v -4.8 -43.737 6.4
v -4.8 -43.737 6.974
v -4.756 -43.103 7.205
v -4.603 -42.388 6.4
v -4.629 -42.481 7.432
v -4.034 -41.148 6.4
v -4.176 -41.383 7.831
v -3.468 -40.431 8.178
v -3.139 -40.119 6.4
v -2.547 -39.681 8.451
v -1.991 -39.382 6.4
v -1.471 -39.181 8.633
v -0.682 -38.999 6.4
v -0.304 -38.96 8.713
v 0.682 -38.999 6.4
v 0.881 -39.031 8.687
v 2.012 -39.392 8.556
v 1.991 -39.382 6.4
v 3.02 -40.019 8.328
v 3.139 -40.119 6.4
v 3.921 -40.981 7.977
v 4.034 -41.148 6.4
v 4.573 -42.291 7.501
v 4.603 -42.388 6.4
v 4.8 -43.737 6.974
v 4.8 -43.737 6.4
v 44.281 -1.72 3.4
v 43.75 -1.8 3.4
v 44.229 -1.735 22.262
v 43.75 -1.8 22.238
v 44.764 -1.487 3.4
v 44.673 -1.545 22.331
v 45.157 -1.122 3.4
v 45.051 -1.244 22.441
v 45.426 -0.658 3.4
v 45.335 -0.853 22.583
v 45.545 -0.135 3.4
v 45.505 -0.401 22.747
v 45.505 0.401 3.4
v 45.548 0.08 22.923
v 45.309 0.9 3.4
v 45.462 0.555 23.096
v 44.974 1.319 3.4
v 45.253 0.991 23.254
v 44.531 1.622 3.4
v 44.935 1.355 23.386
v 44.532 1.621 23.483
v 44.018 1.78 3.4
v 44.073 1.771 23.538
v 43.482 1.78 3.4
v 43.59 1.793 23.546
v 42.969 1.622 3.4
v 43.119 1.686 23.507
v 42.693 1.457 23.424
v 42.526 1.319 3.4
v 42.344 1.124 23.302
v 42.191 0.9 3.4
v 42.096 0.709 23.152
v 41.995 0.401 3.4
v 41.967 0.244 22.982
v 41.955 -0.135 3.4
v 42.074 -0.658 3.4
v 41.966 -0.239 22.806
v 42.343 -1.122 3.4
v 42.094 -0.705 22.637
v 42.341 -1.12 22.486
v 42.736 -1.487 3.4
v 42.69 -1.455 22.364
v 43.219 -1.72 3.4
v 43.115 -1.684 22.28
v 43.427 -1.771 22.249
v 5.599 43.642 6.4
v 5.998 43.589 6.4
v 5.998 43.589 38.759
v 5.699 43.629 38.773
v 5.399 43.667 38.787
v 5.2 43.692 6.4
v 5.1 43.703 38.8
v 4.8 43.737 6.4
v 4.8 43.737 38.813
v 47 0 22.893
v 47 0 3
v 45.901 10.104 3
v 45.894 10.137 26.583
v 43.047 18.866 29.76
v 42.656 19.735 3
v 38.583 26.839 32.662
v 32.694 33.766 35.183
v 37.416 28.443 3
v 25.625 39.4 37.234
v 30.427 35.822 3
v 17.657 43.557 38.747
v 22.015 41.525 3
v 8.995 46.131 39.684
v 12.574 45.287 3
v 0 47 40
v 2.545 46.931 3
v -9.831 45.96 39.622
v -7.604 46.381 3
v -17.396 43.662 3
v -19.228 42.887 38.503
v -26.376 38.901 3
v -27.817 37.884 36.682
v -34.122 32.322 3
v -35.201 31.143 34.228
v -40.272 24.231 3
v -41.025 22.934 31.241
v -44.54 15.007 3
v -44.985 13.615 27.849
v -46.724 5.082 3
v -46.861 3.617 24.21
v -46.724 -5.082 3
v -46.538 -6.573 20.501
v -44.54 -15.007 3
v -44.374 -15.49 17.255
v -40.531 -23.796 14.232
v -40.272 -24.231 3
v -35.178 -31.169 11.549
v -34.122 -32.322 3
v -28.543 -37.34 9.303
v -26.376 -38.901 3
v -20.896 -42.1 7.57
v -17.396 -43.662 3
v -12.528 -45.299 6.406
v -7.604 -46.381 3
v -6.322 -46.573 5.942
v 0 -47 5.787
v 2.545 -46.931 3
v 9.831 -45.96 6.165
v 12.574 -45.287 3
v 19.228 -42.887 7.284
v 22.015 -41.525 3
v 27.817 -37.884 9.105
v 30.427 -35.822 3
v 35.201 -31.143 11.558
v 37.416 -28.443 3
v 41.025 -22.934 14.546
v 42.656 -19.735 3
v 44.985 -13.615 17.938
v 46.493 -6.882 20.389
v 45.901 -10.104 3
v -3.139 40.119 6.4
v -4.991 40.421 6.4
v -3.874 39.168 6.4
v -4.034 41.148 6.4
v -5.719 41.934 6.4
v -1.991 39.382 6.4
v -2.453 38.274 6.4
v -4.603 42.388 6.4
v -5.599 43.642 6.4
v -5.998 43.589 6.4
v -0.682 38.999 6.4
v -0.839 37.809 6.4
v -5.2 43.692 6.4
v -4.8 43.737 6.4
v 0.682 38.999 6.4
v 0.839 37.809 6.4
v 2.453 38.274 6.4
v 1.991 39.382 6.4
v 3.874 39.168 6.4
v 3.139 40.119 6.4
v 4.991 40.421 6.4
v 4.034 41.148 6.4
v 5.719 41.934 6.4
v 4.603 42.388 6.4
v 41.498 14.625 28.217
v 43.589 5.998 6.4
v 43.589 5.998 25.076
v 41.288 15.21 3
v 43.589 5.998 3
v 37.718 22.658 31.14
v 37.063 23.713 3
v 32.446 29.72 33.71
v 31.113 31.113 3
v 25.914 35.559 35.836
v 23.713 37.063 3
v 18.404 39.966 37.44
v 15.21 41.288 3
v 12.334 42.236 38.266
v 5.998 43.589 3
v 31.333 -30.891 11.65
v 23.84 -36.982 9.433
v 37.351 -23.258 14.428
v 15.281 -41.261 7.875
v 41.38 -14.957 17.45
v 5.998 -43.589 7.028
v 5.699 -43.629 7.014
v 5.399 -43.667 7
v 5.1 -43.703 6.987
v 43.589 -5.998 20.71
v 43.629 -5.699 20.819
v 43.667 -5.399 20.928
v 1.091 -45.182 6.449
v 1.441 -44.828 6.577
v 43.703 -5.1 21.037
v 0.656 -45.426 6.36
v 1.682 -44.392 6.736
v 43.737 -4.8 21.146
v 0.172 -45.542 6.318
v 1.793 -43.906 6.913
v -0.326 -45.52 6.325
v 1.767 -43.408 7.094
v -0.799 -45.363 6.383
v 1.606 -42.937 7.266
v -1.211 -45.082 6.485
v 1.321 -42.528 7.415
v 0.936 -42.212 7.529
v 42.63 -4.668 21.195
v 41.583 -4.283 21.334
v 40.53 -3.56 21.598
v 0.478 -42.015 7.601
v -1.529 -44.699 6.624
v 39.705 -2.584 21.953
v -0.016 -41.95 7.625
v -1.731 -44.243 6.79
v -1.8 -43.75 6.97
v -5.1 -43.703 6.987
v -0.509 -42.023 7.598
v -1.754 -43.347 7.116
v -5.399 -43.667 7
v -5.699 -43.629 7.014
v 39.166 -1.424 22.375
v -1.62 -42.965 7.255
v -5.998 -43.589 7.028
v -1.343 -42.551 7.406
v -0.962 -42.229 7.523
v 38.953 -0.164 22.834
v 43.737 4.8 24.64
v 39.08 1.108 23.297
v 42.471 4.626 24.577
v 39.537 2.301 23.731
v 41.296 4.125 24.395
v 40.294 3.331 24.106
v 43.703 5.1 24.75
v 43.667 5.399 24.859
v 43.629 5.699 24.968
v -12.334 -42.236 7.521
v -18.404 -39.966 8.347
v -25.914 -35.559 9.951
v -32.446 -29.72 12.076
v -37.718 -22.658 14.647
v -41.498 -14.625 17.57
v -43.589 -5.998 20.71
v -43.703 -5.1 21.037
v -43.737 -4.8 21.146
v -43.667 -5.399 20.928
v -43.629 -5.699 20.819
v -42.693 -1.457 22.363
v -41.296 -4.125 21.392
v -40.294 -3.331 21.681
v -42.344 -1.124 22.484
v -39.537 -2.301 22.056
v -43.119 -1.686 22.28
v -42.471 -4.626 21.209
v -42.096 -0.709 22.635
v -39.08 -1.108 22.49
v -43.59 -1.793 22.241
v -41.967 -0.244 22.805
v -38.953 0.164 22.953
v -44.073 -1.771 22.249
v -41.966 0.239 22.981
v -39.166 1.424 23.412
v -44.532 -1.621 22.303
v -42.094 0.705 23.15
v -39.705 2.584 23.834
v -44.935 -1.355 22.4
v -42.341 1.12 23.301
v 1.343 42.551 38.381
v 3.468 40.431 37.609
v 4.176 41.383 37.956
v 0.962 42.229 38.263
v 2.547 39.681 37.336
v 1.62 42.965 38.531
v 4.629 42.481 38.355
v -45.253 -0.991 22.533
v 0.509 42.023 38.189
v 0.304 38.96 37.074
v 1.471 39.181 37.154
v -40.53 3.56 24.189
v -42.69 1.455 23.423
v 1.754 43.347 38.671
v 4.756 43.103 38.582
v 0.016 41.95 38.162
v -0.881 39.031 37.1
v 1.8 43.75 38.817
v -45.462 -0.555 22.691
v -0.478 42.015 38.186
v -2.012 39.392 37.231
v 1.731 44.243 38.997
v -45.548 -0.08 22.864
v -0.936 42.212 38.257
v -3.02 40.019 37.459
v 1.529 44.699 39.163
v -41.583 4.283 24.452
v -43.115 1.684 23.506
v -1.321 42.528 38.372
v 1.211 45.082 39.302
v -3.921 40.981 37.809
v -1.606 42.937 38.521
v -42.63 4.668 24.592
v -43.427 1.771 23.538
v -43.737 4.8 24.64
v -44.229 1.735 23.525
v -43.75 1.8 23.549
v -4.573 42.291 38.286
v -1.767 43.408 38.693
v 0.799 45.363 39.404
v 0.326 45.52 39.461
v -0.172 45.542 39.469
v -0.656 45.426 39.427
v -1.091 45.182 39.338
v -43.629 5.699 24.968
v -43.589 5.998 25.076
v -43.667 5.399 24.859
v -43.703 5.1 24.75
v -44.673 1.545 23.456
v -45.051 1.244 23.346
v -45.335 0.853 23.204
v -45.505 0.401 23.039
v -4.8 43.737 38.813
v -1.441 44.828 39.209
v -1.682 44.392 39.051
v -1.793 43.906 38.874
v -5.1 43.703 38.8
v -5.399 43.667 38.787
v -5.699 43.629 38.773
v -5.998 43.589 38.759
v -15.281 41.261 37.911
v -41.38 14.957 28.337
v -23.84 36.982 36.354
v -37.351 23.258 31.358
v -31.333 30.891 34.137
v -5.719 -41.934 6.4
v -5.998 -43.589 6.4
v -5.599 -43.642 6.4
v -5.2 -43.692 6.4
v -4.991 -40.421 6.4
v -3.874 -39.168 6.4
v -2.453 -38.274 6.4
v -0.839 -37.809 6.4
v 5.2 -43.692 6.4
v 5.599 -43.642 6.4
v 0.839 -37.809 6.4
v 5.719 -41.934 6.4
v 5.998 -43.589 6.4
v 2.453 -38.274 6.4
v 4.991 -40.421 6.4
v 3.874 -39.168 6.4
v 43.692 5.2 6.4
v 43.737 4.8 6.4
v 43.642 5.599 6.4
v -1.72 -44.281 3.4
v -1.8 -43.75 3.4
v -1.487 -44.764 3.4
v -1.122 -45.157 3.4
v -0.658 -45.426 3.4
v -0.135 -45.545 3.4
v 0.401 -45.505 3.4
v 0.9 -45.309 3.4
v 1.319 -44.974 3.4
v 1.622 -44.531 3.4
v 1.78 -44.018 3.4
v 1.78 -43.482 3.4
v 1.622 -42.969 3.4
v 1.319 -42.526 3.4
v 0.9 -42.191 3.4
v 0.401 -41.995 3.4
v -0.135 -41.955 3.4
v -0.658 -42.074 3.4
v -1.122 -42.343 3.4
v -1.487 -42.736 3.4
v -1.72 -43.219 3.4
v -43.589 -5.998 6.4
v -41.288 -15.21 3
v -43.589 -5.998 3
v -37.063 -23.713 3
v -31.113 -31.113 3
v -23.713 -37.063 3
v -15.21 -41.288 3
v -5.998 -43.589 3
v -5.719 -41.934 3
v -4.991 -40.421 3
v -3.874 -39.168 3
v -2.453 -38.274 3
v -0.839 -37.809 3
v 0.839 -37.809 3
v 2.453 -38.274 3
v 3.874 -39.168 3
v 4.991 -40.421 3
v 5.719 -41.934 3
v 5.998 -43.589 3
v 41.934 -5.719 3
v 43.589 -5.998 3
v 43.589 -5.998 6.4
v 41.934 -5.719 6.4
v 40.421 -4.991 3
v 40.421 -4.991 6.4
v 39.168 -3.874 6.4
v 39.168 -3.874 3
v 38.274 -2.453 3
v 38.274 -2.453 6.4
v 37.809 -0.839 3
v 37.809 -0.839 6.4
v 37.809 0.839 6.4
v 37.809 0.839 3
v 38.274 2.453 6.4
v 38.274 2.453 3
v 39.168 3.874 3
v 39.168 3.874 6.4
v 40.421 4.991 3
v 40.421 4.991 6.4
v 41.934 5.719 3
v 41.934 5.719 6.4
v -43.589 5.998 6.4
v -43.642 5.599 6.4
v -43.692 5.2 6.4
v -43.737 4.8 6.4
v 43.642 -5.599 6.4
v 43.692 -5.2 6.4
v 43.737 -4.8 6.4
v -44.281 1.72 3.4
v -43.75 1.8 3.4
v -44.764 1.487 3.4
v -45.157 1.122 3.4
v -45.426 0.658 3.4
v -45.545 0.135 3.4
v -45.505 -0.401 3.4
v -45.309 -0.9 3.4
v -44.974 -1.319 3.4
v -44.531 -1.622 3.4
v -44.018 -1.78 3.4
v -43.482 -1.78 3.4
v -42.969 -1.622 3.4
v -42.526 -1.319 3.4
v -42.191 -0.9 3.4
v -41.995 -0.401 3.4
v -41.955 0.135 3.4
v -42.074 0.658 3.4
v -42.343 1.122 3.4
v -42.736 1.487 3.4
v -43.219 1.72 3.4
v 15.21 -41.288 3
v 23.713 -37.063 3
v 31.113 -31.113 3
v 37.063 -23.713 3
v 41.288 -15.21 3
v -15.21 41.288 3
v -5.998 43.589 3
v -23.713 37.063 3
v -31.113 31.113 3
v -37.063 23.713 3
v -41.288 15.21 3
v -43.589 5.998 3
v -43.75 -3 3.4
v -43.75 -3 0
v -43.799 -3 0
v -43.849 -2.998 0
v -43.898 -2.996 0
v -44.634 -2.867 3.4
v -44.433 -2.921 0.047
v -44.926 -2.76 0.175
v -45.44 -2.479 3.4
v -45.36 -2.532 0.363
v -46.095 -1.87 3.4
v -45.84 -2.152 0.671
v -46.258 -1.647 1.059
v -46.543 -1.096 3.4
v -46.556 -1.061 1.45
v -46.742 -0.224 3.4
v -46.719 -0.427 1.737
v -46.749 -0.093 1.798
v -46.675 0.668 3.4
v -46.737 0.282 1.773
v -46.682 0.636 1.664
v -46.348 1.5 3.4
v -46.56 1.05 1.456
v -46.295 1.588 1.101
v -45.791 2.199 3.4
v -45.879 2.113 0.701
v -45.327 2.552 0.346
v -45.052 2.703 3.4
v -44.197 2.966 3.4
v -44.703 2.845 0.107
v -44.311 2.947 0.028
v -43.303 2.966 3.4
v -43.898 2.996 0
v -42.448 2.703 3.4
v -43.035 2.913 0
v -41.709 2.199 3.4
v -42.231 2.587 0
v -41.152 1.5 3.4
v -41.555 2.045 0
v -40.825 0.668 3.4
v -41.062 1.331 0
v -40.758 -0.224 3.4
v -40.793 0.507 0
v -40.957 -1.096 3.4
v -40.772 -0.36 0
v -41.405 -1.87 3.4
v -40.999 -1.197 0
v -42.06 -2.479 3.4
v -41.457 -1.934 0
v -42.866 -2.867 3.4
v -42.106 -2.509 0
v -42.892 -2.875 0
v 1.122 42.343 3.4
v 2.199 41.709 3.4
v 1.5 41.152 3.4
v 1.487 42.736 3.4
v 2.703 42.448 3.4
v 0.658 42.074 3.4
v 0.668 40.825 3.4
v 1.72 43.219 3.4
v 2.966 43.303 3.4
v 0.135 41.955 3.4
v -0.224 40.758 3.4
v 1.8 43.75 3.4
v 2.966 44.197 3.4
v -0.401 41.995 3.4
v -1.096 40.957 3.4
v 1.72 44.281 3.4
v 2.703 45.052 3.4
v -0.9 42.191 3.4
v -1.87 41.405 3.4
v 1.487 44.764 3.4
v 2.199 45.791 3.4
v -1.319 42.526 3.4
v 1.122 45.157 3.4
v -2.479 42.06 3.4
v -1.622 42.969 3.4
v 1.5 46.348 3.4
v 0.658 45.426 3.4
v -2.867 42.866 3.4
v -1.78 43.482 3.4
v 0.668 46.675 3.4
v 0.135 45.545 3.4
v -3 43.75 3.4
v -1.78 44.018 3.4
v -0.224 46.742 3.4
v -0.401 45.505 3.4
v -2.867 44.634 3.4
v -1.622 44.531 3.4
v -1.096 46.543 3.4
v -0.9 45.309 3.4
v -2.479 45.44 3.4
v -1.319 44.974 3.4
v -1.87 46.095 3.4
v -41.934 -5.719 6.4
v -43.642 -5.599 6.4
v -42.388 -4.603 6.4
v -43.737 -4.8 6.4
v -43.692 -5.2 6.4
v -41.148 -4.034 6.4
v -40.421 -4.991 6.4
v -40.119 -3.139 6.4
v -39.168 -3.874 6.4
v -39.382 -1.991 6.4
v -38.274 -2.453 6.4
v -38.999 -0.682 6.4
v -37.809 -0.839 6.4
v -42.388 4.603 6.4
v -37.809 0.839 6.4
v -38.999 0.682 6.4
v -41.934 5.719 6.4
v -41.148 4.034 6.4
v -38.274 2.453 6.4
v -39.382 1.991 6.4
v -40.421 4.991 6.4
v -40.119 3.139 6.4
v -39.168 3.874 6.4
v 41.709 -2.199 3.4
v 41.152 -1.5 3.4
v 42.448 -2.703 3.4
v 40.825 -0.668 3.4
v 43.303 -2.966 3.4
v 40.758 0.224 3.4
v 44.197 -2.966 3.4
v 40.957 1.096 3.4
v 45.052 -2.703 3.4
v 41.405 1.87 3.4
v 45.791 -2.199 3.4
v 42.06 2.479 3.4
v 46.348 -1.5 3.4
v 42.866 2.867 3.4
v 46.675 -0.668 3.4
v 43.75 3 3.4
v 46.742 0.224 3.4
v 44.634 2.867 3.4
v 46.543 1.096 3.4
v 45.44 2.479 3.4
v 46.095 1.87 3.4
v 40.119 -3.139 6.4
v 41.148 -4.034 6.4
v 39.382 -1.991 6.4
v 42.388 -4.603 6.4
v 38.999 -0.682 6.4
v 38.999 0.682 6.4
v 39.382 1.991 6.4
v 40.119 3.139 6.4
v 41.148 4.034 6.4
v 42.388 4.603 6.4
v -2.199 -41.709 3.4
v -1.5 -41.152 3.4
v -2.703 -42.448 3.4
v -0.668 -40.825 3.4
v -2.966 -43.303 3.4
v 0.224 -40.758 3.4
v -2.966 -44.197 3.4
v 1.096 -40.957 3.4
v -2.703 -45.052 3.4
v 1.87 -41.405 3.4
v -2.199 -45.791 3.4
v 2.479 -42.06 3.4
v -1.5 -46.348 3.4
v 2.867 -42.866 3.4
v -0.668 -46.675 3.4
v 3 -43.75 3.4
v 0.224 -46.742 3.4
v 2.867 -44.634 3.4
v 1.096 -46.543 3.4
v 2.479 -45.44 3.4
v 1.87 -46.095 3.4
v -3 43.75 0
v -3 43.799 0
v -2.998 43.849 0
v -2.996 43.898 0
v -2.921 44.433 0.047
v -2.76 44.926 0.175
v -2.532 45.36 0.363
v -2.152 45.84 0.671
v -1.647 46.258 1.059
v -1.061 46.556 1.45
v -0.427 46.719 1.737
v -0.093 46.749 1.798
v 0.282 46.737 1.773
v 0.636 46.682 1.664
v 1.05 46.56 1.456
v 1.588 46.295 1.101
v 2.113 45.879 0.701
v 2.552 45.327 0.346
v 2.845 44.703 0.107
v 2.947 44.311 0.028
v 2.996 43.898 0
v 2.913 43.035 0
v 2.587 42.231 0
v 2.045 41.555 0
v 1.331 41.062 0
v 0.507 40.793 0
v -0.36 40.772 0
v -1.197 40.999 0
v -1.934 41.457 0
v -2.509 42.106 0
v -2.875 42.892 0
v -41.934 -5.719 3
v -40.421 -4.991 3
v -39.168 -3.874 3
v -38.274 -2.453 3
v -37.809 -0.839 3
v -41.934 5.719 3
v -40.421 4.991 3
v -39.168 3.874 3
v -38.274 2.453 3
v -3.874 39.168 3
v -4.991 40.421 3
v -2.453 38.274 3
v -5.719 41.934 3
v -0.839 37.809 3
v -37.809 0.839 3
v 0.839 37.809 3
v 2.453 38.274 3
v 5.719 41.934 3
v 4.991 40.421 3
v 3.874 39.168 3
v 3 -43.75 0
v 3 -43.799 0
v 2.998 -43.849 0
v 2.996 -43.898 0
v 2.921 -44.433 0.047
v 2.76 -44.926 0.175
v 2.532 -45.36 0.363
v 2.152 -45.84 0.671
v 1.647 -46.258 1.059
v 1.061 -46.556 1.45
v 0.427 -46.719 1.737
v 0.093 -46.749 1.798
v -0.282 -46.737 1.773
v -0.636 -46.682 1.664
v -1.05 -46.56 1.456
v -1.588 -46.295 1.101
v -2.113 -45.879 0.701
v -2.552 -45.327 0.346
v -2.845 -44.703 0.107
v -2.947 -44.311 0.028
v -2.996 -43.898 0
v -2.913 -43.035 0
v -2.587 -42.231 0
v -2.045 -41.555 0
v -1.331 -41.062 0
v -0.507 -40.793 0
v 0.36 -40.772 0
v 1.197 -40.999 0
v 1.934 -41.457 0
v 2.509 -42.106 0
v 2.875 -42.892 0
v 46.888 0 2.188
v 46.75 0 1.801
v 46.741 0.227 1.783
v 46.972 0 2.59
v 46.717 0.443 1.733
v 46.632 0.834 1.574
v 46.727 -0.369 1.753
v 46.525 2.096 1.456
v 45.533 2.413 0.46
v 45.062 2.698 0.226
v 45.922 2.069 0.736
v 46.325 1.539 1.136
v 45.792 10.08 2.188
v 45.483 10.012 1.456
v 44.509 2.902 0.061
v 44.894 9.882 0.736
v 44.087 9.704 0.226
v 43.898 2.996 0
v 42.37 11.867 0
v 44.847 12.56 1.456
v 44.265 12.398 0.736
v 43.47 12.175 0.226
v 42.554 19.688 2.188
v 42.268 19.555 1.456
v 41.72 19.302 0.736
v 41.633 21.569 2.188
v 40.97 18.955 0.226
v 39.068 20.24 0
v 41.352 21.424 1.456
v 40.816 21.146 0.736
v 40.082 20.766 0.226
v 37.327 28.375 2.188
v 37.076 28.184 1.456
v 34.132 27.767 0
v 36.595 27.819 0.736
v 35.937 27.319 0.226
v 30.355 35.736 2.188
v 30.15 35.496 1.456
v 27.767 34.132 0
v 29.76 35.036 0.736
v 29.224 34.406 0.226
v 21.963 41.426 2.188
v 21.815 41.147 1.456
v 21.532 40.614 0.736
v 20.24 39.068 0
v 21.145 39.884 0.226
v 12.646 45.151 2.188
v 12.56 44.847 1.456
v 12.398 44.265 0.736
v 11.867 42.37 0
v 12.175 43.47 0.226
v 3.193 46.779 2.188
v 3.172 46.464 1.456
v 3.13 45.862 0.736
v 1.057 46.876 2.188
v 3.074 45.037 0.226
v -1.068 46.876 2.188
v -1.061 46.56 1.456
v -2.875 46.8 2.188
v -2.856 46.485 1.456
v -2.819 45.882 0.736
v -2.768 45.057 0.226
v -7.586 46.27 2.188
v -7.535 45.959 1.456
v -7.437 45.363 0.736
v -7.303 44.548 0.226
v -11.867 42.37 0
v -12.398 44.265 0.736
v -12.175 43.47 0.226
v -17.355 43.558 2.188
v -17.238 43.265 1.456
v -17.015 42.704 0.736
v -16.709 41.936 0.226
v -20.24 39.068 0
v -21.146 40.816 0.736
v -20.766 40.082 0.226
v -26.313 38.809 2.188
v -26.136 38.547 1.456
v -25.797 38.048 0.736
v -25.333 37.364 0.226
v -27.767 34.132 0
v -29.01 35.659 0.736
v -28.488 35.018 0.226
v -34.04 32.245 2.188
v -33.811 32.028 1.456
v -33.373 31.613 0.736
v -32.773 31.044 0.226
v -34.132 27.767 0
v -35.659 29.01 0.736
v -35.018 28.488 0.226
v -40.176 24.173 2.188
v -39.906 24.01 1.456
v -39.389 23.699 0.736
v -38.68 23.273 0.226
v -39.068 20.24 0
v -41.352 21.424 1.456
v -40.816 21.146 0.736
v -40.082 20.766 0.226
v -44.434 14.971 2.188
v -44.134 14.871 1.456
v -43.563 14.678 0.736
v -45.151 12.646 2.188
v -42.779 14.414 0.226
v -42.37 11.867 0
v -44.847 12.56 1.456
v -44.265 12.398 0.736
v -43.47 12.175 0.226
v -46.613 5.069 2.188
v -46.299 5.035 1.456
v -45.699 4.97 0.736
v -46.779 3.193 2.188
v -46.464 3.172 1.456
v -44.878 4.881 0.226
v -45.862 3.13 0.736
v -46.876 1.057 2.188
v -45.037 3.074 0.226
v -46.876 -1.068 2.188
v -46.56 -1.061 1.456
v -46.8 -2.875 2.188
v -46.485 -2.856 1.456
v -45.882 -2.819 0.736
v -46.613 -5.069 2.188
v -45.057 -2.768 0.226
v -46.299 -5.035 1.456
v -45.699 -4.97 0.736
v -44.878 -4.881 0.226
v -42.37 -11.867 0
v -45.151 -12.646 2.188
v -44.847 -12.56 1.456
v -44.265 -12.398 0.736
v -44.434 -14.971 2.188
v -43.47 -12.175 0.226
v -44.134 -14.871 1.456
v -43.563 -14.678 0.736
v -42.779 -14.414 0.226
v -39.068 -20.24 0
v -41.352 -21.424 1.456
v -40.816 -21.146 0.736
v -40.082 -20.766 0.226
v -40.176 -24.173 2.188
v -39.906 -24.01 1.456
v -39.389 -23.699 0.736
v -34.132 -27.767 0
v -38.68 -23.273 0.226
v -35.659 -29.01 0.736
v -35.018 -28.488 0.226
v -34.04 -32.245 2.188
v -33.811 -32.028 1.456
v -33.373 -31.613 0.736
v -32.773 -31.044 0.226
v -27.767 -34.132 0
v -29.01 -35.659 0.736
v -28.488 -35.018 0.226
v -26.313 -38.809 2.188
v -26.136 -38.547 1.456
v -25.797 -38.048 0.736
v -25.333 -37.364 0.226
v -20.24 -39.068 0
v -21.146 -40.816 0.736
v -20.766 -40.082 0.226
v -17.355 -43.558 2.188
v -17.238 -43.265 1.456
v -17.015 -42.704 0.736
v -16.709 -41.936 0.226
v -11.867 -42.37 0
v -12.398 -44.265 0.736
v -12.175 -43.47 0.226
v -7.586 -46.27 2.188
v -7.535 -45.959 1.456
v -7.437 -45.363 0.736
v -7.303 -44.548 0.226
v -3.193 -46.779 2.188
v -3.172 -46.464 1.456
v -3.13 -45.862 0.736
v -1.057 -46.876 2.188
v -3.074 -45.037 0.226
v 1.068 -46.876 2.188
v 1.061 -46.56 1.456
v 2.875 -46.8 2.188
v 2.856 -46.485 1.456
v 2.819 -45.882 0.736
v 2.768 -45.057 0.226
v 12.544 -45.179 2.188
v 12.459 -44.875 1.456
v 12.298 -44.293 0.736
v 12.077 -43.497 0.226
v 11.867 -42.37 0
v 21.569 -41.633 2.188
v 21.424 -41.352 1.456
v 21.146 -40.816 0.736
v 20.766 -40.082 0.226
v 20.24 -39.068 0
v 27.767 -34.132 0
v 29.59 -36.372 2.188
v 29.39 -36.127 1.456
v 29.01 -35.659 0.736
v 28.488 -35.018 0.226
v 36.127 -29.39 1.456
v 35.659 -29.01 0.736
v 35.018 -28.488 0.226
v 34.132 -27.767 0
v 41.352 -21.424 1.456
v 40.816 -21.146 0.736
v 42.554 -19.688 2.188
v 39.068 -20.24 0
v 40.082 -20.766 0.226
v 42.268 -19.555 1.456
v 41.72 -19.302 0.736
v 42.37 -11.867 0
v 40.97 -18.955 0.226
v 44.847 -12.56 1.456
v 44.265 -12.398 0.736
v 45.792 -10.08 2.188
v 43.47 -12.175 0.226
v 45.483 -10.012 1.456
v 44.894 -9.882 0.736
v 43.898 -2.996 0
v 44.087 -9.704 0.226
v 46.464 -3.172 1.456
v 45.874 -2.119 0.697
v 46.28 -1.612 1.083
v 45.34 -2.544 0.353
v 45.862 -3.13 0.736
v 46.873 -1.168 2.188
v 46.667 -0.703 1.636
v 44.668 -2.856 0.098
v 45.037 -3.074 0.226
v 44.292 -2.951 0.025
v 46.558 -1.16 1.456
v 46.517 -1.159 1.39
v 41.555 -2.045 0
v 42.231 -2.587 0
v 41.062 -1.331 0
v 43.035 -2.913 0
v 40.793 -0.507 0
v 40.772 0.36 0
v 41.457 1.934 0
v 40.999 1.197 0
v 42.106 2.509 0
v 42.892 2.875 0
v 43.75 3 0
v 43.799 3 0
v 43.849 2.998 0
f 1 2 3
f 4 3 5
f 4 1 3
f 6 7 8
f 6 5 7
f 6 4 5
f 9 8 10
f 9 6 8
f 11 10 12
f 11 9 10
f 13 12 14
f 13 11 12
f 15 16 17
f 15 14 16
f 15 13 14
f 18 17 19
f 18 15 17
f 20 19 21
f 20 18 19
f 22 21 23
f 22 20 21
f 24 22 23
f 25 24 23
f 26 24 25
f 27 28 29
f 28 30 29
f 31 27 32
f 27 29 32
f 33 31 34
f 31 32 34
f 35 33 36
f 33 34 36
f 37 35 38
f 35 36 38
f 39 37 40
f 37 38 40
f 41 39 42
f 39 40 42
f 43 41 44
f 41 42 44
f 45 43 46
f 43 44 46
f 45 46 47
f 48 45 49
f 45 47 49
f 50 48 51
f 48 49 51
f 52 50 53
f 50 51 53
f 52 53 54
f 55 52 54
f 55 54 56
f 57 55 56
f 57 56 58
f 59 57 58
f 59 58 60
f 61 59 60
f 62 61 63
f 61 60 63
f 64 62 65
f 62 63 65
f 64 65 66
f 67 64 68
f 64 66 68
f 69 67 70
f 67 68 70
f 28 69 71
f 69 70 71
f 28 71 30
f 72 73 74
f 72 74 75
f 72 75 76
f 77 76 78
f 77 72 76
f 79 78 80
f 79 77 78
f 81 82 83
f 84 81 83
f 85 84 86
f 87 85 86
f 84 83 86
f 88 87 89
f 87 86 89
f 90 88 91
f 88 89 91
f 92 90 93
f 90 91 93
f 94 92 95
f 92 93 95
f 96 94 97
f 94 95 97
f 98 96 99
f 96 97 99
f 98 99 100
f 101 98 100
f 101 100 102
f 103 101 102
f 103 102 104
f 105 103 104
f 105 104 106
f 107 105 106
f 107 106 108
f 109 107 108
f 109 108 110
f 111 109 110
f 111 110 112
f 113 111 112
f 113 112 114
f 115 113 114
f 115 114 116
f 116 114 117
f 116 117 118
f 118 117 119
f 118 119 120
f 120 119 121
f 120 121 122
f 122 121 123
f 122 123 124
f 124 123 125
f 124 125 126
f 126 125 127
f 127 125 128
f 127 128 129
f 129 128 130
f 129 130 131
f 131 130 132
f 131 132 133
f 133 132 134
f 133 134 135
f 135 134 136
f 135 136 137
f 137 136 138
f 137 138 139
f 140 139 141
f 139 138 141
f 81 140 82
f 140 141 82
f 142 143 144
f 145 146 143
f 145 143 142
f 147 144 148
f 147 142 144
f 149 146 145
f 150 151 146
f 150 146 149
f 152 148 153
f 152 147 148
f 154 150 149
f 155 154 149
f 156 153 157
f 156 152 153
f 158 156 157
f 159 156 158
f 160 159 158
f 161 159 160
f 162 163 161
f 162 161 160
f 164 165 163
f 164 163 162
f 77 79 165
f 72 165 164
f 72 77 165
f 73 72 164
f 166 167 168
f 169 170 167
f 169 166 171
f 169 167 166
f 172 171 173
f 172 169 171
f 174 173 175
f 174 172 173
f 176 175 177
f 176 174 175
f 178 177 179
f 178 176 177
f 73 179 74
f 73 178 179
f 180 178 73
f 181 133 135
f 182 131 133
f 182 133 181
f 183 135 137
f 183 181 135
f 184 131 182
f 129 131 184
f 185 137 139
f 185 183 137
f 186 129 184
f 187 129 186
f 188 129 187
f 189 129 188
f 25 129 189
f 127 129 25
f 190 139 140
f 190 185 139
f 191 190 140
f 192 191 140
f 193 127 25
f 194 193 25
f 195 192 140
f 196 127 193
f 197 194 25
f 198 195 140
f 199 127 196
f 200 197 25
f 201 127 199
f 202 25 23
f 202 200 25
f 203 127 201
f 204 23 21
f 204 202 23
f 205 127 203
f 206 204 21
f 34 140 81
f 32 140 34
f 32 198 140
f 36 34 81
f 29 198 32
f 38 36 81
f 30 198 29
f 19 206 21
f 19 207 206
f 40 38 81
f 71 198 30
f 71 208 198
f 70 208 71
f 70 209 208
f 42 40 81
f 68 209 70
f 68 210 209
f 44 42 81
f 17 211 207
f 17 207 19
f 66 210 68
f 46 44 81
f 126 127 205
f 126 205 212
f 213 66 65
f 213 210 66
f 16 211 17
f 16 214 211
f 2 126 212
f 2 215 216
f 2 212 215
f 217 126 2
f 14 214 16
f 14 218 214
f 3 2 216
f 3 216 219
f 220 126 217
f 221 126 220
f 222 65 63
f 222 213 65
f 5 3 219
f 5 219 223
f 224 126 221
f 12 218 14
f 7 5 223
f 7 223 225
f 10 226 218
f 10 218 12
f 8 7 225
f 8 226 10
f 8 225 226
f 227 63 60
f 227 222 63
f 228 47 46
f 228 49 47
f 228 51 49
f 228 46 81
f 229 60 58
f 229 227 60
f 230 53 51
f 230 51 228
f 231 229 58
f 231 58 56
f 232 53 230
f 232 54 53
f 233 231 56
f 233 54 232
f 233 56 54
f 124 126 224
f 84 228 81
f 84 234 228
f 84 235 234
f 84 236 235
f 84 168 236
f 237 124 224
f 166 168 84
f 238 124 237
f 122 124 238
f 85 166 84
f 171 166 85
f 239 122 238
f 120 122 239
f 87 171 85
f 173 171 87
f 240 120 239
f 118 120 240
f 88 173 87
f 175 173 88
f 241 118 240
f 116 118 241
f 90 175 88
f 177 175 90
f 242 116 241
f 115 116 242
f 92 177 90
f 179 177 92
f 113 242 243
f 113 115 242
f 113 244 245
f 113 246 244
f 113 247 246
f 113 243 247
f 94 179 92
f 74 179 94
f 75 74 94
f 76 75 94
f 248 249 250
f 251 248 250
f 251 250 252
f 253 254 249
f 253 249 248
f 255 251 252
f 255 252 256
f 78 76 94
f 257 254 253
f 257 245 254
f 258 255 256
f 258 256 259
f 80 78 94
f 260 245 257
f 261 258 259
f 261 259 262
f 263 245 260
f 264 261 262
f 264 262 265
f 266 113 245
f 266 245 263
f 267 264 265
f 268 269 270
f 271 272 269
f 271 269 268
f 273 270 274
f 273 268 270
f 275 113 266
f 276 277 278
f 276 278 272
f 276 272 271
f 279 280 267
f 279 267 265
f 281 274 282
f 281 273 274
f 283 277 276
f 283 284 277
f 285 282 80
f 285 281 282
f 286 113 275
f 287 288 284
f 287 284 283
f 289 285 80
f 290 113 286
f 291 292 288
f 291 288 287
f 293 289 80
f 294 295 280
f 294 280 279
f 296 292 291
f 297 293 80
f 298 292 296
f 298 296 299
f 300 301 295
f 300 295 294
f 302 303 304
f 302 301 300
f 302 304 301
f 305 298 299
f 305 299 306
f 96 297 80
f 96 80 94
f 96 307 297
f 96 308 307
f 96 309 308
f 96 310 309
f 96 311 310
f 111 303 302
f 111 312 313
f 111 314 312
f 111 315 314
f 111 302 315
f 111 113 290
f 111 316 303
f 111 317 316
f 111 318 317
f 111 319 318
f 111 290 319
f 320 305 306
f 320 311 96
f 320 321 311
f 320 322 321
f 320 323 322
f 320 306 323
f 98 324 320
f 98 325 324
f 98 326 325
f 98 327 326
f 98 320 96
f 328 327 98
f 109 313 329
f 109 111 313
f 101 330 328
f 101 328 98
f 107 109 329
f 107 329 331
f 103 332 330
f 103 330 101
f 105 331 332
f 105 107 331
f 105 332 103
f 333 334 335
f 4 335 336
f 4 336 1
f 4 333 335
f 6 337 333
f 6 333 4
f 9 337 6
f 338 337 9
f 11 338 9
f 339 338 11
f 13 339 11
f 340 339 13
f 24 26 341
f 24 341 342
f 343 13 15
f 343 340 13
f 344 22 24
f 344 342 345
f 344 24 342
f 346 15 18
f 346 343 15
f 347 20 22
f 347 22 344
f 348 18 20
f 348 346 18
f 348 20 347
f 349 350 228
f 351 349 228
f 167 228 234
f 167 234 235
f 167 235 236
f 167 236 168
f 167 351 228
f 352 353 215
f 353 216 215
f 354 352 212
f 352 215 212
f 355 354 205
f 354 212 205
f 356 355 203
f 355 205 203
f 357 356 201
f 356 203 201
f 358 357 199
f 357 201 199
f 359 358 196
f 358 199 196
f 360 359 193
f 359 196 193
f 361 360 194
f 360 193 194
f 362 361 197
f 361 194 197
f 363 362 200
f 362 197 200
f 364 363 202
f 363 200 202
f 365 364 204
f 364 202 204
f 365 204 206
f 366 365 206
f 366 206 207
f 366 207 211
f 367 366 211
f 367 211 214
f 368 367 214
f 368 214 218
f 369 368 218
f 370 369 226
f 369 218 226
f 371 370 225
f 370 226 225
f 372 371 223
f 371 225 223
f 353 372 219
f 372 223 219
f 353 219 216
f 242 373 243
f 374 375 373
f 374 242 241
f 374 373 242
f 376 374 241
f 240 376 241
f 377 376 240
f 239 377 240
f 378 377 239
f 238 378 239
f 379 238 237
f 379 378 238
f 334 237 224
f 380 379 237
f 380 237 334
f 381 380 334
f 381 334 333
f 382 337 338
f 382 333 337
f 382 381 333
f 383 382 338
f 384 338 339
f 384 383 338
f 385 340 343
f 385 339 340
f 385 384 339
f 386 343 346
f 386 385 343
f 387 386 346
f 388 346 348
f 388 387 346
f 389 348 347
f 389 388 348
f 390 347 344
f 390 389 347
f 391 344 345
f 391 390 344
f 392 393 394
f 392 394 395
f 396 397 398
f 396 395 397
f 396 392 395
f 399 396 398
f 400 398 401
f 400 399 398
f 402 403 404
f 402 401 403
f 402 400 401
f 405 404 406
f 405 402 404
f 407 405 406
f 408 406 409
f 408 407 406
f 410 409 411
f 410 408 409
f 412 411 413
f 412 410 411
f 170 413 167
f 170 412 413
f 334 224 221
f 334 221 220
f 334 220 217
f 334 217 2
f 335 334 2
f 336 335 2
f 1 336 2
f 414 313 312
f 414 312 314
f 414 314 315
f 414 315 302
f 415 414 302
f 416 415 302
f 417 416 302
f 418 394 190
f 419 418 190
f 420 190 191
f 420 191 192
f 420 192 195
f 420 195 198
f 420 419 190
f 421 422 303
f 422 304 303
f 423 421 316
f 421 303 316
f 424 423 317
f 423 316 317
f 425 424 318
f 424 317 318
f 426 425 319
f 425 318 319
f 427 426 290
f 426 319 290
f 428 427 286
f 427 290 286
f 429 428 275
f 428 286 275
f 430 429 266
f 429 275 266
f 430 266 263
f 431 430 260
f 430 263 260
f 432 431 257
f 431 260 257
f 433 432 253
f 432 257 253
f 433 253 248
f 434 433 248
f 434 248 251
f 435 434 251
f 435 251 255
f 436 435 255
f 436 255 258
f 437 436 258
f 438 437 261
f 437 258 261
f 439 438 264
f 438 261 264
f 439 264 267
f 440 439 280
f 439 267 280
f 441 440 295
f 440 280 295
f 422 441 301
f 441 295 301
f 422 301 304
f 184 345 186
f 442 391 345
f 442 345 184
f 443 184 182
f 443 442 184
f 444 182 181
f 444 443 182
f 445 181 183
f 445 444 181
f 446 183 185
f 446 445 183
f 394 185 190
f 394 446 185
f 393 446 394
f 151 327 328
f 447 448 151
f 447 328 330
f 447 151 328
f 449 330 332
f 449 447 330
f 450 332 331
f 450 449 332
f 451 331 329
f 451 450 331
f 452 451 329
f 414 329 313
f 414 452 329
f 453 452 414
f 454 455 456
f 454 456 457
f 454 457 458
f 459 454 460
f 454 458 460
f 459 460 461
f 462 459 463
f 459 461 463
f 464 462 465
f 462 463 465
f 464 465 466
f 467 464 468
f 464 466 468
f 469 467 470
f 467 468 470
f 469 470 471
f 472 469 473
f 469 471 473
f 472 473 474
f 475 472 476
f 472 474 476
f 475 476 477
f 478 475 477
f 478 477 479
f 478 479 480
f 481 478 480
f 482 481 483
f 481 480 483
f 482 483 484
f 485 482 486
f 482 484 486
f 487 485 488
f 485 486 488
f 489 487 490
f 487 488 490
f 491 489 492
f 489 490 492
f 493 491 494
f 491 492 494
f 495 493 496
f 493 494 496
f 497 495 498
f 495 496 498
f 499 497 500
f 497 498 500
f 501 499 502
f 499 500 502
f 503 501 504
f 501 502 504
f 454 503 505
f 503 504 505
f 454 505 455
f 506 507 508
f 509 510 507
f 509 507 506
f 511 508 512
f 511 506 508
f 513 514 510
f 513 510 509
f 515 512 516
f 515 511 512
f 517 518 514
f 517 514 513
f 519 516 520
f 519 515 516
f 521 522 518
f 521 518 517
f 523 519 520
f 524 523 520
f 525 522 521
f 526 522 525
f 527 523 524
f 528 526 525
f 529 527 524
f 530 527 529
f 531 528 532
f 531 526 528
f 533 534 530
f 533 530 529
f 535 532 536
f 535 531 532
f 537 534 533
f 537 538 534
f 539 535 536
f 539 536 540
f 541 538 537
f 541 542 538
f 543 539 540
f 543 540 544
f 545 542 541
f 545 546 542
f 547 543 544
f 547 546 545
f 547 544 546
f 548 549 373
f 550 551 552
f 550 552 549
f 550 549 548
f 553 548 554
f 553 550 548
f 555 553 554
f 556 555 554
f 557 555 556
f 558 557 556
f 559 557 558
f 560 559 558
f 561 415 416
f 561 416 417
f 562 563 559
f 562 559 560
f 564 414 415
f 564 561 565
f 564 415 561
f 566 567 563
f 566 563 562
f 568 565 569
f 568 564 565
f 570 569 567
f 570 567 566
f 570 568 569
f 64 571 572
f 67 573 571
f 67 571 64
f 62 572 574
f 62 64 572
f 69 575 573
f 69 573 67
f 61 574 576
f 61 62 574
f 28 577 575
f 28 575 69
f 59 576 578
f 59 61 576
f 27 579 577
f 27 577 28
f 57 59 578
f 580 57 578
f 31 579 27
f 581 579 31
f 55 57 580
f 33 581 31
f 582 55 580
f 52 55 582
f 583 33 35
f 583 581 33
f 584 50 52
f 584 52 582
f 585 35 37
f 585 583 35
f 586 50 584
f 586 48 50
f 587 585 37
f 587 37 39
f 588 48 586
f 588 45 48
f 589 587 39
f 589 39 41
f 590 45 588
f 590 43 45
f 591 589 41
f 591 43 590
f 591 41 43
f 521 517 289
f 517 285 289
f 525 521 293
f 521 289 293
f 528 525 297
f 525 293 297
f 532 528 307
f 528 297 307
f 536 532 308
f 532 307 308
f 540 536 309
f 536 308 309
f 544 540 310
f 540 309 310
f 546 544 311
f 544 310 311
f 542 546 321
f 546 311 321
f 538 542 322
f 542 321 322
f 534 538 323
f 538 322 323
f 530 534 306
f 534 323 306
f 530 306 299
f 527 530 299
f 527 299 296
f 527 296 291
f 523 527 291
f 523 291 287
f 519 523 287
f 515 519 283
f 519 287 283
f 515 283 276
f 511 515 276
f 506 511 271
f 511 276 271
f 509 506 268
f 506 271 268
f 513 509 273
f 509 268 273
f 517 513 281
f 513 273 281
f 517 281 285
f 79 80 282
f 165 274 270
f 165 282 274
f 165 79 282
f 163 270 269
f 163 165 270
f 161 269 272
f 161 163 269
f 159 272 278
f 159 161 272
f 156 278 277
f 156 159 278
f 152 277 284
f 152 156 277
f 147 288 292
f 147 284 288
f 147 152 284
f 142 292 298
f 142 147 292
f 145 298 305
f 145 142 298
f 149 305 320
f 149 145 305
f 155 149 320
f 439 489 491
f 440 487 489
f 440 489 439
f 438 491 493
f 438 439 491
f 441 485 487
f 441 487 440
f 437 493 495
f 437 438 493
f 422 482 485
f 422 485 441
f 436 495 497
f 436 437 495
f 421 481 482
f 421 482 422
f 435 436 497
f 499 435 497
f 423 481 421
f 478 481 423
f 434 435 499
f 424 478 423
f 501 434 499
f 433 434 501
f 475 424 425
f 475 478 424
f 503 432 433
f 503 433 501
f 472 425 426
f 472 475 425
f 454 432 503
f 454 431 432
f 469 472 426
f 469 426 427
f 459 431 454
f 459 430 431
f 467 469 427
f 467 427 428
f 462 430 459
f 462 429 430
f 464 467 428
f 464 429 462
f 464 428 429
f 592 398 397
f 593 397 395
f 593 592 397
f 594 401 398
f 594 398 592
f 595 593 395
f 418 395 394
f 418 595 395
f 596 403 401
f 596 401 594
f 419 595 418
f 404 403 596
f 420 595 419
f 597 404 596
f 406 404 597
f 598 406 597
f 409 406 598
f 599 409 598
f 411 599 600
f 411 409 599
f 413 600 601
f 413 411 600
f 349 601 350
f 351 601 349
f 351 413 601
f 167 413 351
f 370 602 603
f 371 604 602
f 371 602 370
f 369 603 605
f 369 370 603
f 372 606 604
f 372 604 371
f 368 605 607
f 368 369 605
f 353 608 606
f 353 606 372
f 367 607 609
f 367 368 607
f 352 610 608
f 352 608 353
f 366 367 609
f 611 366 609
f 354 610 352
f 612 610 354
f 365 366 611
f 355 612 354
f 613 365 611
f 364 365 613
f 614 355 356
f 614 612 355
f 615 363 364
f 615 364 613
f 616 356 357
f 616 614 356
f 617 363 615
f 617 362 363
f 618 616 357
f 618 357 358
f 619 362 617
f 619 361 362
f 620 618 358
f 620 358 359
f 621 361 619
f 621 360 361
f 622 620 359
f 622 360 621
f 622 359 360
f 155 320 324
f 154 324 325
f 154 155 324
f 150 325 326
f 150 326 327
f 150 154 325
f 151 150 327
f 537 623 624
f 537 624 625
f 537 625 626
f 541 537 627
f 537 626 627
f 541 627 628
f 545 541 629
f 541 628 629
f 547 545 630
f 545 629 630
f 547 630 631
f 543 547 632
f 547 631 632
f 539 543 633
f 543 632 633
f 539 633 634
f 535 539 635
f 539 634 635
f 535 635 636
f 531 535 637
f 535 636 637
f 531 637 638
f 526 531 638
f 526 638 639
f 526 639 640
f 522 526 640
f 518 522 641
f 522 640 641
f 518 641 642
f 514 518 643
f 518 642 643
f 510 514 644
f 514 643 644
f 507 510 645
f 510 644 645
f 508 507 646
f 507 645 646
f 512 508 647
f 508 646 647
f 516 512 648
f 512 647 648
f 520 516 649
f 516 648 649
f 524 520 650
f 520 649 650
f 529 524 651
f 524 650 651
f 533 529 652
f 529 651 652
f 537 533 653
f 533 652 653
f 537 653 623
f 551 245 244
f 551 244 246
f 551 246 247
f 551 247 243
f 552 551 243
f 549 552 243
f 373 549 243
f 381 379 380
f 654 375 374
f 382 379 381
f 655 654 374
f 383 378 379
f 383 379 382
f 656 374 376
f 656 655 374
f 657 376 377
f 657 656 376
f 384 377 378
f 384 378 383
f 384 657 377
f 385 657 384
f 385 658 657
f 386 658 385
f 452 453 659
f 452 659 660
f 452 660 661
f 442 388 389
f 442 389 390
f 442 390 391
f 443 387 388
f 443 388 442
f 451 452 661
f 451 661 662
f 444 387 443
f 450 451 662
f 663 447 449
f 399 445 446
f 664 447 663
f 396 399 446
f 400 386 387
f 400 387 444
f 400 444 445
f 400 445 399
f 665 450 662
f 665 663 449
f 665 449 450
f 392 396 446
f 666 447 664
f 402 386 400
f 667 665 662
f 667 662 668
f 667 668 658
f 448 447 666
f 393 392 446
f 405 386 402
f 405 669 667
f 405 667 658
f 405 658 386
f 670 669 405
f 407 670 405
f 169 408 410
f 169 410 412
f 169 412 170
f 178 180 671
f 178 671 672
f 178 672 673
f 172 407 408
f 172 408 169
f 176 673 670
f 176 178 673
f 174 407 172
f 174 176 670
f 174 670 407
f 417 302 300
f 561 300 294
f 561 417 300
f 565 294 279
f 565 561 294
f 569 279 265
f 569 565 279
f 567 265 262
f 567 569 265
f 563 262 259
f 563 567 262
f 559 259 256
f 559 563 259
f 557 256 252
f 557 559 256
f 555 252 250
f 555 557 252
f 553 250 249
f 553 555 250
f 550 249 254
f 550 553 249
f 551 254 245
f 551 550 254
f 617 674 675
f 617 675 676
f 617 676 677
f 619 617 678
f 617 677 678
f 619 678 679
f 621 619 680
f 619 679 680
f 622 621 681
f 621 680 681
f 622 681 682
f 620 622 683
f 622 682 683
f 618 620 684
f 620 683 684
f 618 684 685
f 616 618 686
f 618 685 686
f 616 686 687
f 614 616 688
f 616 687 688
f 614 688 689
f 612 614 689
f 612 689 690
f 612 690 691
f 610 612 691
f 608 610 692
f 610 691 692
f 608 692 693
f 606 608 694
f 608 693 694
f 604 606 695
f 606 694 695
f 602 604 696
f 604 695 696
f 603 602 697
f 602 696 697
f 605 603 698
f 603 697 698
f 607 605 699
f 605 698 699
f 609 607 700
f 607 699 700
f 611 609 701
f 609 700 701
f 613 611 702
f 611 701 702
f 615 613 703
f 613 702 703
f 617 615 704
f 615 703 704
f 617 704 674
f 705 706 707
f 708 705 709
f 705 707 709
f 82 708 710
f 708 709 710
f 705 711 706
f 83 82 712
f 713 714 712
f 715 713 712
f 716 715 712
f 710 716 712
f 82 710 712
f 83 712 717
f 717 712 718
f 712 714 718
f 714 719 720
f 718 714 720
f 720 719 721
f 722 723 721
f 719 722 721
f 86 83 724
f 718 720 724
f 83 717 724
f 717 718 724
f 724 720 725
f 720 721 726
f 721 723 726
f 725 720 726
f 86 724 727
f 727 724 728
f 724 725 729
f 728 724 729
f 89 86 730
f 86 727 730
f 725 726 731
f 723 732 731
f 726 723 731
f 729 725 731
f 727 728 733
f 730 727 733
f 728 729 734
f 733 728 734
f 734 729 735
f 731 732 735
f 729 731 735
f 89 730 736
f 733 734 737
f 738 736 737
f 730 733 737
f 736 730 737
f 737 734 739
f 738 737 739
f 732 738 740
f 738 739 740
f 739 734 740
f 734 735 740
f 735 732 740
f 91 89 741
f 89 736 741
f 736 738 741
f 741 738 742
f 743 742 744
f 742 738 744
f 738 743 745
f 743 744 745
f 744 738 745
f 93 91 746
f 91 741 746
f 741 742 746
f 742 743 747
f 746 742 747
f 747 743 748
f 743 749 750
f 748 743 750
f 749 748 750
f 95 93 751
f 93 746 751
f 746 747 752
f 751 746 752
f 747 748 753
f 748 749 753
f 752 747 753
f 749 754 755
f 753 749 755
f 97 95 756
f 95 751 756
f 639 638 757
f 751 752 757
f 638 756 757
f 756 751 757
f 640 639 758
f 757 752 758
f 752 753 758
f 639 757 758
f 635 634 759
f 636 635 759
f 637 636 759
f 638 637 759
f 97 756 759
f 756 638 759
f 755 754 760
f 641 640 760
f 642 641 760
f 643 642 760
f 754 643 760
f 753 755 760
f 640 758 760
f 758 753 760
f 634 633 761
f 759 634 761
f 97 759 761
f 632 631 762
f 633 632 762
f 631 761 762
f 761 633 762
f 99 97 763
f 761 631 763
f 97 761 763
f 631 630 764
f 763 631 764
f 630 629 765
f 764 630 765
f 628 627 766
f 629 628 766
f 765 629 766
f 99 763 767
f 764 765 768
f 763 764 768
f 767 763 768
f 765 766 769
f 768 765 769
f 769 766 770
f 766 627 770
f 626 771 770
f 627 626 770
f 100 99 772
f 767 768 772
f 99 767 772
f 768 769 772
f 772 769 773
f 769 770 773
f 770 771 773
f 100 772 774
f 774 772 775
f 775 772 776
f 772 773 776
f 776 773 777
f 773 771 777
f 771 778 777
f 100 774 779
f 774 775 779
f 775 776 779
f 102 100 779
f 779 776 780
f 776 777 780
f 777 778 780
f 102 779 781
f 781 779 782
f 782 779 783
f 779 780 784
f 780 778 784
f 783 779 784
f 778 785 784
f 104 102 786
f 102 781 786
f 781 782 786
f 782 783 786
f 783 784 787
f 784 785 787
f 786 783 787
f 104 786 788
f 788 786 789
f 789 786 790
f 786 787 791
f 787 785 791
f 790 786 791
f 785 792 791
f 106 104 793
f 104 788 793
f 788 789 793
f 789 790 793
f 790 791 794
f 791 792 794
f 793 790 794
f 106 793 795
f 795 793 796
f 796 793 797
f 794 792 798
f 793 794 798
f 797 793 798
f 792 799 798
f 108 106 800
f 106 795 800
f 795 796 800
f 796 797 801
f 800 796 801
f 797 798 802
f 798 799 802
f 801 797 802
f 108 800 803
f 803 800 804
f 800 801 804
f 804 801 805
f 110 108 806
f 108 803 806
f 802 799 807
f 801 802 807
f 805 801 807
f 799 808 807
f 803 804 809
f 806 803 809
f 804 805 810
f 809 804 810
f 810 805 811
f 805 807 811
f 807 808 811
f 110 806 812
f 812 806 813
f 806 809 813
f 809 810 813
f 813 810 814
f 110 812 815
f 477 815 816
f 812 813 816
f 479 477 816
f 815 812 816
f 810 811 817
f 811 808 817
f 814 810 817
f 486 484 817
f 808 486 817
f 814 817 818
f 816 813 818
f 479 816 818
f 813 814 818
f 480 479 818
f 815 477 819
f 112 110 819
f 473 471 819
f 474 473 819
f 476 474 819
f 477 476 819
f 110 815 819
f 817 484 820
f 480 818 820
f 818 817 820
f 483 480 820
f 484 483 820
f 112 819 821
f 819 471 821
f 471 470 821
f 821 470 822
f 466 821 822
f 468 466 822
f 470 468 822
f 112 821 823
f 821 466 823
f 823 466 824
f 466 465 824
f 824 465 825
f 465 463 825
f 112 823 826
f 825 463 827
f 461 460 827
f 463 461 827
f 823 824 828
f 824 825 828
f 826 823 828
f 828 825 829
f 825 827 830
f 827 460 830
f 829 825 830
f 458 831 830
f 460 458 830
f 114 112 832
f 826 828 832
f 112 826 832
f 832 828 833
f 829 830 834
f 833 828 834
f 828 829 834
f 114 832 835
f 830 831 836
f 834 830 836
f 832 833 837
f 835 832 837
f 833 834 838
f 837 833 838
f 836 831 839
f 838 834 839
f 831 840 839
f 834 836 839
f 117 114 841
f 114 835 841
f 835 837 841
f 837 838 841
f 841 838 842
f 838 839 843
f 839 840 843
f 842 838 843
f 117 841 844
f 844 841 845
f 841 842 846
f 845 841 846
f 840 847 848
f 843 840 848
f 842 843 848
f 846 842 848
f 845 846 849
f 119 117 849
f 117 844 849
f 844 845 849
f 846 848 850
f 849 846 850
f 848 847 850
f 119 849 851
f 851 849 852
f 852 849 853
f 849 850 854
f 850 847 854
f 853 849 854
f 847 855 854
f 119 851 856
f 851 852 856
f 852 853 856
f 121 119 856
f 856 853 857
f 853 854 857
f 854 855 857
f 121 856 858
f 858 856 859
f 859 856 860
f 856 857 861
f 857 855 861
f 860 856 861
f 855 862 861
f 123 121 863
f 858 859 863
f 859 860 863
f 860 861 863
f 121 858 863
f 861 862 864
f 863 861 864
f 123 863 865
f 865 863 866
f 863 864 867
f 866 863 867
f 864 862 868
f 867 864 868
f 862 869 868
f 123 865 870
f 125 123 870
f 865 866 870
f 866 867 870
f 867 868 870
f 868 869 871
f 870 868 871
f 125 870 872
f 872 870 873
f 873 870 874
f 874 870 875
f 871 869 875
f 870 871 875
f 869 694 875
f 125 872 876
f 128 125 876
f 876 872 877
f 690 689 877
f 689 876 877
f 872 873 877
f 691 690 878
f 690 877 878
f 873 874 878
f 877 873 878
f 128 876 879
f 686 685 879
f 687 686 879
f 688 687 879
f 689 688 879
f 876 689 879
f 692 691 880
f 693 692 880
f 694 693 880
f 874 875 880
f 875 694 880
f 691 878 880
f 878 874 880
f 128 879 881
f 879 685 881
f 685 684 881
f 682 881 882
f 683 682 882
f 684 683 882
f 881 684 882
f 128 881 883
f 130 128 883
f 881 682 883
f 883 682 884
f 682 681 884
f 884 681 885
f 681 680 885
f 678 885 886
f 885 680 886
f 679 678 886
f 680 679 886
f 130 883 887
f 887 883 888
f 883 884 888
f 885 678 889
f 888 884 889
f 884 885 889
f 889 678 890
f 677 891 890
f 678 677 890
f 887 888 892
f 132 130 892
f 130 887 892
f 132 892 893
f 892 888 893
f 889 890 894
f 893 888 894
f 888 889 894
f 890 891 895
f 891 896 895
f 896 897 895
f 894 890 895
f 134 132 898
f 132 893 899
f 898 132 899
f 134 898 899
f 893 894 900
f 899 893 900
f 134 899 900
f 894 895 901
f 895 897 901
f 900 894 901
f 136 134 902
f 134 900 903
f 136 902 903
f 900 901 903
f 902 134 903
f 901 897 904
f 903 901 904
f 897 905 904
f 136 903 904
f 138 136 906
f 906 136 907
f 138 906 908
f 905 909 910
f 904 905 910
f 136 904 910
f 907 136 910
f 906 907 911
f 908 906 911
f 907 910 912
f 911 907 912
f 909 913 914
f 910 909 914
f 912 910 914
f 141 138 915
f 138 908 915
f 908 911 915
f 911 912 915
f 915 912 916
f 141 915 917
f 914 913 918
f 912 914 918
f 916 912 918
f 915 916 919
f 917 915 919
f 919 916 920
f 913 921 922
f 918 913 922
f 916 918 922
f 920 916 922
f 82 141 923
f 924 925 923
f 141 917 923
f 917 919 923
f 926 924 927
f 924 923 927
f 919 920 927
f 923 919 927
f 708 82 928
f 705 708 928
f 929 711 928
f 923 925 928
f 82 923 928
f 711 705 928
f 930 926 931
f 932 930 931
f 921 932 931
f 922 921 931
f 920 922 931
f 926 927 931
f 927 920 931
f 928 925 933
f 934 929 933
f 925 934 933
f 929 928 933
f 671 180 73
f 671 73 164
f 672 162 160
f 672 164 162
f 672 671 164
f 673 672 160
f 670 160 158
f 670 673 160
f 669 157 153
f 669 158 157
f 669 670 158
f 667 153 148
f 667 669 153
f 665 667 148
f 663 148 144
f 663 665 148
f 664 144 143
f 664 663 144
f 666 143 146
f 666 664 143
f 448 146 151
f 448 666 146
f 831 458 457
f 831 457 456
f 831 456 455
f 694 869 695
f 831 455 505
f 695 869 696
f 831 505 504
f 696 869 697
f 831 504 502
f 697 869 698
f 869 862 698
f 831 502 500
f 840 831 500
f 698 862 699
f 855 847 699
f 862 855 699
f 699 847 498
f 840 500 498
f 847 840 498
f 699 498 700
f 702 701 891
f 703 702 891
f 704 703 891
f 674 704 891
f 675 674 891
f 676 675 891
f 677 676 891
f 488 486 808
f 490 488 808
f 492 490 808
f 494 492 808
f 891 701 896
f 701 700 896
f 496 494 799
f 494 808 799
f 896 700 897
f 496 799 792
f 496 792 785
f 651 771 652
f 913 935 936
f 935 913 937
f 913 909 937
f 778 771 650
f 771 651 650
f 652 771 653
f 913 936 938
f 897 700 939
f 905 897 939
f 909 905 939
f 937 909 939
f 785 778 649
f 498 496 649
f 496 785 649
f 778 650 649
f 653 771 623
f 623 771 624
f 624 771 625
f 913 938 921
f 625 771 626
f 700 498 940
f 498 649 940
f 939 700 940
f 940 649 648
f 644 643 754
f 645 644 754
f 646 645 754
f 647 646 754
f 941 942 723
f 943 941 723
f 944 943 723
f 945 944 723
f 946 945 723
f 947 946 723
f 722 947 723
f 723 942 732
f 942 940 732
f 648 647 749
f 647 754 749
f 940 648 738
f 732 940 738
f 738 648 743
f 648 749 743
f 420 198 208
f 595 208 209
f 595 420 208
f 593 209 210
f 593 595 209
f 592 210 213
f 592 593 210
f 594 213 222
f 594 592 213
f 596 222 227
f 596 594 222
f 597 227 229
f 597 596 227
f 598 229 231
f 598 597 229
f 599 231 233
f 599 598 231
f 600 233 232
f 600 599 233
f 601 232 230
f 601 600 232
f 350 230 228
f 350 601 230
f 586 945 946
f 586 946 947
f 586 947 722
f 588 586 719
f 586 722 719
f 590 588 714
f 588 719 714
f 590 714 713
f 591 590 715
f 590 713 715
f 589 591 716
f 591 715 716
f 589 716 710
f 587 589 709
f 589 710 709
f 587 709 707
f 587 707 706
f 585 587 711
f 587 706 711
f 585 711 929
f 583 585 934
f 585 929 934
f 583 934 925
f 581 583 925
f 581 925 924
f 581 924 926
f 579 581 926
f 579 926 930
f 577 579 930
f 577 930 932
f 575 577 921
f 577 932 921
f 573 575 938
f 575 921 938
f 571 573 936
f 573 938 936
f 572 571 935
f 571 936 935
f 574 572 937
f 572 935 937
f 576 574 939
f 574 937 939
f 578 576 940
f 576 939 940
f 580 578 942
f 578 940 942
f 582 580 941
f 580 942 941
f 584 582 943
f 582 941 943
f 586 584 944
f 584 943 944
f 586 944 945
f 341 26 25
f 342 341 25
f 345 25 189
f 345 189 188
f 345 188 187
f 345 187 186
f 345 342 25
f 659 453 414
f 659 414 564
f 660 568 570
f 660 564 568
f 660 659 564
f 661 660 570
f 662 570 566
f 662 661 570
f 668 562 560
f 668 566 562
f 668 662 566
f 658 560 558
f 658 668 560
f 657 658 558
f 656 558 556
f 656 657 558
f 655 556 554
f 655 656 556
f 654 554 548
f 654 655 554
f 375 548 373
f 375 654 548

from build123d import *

# Parameters (mm, degrees)
SKETCH_1_R                = 47
EXTRUDE_1_DEPTH           = 40
CUT_EXTRUDE_1_DEPTH       = 78.575769413
CUT_EXTRUDE_1_DEPTH_BACK  = 78.575769413
FILLET_1_R                = 3
HOLE_WIZARD_1_D           = 3.6
HOLE_WIZARD_1_CBORE_D     = 6
HOLE_WIZARD_1_CBORE_DEPTH = 3.4
PATTERN_CIRCULAR_1_COUNT  = 4
SHELL_START               = 3
SHELL_1_DEPTH             = 35.812510714
SHELL_START_2             = 6.4
SHELL_1_2_DEPTH           = 32.412510714


# Read off the part's stored shape, not the designer's step: 抽壳1
with BuildPart() as part:
    # 草图1 → 凸台-拉伸1 (new body)
    with BuildSketch(Plane.XY):
        Circle(SKETCH_1_R)
    extrude(amount=EXTRUDE_1_DEPTH)

    # 草图2 → 切除-拉伸1 (cut, two sides: drawn at the far end of the back side and taken through both)
    with BuildSketch(Plane(origin=(0, 0, 0), x_dir=(0, 0, -1), z_dir=(1, 0, 0)).offset(-CUT_EXTRUDE_1_DEPTH_BACK)):
        Polygon((-40, 47), (-40, -47), (-5.786797979, -47), align=None)
    extrude(amount=CUT_EXTRUDE_1_DEPTH + CUT_EXTRUDE_1_DEPTH_BACK, mode=Mode.SUBTRACT)

    # 圆角1
    fillet_1_edges = [part.edges().sort_by_distance(p)[0] for p in [
        (-47, 0, 0),
    ]]
    fillet(fillet_1_edges, radius=FILLET_1_R)

    # 打孔尺寸(%根据)内六角圆柱头螺钉的类型1 (through all)
    with Locations(Plane(origin=(0, 0, 0), x_dir=(-1, 0, 0), z_dir=(0, 0, -1))):
        with Locations((0, 43.75)):
            hole_wizard_1 = CounterBoreHole(HOLE_WIZARD_1_D / 2, HOLE_WIZARD_1_CBORE_D / 2, HOLE_WIZARD_1_CBORE_DEPTH)

    # 阵列(圆周)1: 打孔尺寸(%根据)内六角圆柱头螺钉的类型1 ×4 about axis
    pattern_circular_1_axis = Axis((0, 0, 0), (0, 0, 1))
    for i in range(1, PATTERN_CIRCULAR_1_COUNT):
        add(hole_wizard_1.rotate(pattern_circular_1_axis, i * 360 / PATTERN_CIRCULAR_1_COUNT), mode=Mode.SUBTRACT)

    # 抽壳1 outline → 抽壳1 (cut)
    with BuildSketch(Plane.XY.offset(SHELL_START)):
        with BuildLine():
            ThreePointArc((-43.589285714, -5.99784719), (-31.112698372, -31.112698372), (-5.99784719, -43.589285714))
            ThreePointArc((-5.99784719, -43.589285714), (0, -37.75), (5.99784719, -43.589285714))
            ThreePointArc((5.99784719, -43.589285714), (31.112698372, -31.112698372), (43.589285714, -5.99784719))
            ThreePointArc((43.589285714, -5.99784719), (37.75, 0), (43.589285714, 5.99784719))
            ThreePointArc((43.589285714, 5.99784719), (31.112698372, 31.112698372), (5.99784719, 43.589285714))
            ThreePointArc((5.99784719, 43.589285714), (0, 37.75), (-5.99784719, 43.589285714))
            ThreePointArc((-5.99784719, 43.589285714), (-31.112698372, 31.112698372), (-43.589285714, 5.99784719))
            ThreePointArc((-43.589285714, 5.99784719), (-37.75, 0), (-43.589285714, -5.99784719))
        make_face()
    extrude(amount=SHELL_1_DEPTH, mode=Mode.SUBTRACT)

    # Shell 1 2 outline → Shell 1 2 (cut)
    with BuildSketch(Plane.XY.offset(SHELL_START_2)):
        with BuildLine():
            ThreePointArc((5.99784719, -43.589285714), (0, -37.75), (-5.99784719, -43.589285714))
            ThreePointArc((-5.99784719, -43.589285714), (-5.399423225, -43.66745045), (-4.799983462, -43.7374))
            ThreePointArc((-4.799983462, -43.7374), (0, -38.95), (4.799983462, -43.7374))
            ThreePointArc((4.799983462, -43.7374), (5.399423225, -43.66745045), (5.99784719, -43.589285714))
        make_face()
        with BuildLine():
            ThreePointArc((-43.7374, -4.799983462), (-43.66745045, -5.399423225), (-43.589285714, -5.99784719))
            ThreePointArc((-43.589285714, -5.99784719), (-37.75, 0), (-43.589285714, 5.99784719))
            ThreePointArc((-43.589285714, 5.99784719), (-43.66745045, 5.399423225), (-43.7374, 4.799983462))
            ThreePointArc((-43.7374, 4.799983462), (-38.95, 0), (-43.7374, -4.799983462))
        make_face()
        with BuildLine():
            ThreePointArc((43.589285714, 5.99784719), (37.75, 0), (43.589285714, -5.99784719))
            ThreePointArc((43.589285714, -5.99784719), (43.66745045, -5.399423225), (43.7374, -4.799983462))
            ThreePointArc((43.7374, -4.799983462), (38.95, 0), (43.7374, 4.799983462))
            ThreePointArc((43.7374, 4.799983462), (43.66745045, 5.399423225), (43.589285714, 5.99784719))
        make_face()
        with BuildLine():
            ThreePointArc((-4.799983462, 43.7374), (-5.399423225, 43.66745045), (-5.99784719, 43.589285714))
            ThreePointArc((-5.99784719, 43.589285714), (0, 37.75), (5.99784719, 43.589285714))
            ThreePointArc((5.99784719, 43.589285714), (5.399423225, 43.66745045), (4.799983462, 43.7374))
            ThreePointArc((4.799983462, 43.7374), (0, 38.95), (-4.799983462, 43.7374))
        make_face()
    extrude(amount=SHELL_1_2_DEPTH, mode=Mode.SUBTRACT)


solid = part.part
